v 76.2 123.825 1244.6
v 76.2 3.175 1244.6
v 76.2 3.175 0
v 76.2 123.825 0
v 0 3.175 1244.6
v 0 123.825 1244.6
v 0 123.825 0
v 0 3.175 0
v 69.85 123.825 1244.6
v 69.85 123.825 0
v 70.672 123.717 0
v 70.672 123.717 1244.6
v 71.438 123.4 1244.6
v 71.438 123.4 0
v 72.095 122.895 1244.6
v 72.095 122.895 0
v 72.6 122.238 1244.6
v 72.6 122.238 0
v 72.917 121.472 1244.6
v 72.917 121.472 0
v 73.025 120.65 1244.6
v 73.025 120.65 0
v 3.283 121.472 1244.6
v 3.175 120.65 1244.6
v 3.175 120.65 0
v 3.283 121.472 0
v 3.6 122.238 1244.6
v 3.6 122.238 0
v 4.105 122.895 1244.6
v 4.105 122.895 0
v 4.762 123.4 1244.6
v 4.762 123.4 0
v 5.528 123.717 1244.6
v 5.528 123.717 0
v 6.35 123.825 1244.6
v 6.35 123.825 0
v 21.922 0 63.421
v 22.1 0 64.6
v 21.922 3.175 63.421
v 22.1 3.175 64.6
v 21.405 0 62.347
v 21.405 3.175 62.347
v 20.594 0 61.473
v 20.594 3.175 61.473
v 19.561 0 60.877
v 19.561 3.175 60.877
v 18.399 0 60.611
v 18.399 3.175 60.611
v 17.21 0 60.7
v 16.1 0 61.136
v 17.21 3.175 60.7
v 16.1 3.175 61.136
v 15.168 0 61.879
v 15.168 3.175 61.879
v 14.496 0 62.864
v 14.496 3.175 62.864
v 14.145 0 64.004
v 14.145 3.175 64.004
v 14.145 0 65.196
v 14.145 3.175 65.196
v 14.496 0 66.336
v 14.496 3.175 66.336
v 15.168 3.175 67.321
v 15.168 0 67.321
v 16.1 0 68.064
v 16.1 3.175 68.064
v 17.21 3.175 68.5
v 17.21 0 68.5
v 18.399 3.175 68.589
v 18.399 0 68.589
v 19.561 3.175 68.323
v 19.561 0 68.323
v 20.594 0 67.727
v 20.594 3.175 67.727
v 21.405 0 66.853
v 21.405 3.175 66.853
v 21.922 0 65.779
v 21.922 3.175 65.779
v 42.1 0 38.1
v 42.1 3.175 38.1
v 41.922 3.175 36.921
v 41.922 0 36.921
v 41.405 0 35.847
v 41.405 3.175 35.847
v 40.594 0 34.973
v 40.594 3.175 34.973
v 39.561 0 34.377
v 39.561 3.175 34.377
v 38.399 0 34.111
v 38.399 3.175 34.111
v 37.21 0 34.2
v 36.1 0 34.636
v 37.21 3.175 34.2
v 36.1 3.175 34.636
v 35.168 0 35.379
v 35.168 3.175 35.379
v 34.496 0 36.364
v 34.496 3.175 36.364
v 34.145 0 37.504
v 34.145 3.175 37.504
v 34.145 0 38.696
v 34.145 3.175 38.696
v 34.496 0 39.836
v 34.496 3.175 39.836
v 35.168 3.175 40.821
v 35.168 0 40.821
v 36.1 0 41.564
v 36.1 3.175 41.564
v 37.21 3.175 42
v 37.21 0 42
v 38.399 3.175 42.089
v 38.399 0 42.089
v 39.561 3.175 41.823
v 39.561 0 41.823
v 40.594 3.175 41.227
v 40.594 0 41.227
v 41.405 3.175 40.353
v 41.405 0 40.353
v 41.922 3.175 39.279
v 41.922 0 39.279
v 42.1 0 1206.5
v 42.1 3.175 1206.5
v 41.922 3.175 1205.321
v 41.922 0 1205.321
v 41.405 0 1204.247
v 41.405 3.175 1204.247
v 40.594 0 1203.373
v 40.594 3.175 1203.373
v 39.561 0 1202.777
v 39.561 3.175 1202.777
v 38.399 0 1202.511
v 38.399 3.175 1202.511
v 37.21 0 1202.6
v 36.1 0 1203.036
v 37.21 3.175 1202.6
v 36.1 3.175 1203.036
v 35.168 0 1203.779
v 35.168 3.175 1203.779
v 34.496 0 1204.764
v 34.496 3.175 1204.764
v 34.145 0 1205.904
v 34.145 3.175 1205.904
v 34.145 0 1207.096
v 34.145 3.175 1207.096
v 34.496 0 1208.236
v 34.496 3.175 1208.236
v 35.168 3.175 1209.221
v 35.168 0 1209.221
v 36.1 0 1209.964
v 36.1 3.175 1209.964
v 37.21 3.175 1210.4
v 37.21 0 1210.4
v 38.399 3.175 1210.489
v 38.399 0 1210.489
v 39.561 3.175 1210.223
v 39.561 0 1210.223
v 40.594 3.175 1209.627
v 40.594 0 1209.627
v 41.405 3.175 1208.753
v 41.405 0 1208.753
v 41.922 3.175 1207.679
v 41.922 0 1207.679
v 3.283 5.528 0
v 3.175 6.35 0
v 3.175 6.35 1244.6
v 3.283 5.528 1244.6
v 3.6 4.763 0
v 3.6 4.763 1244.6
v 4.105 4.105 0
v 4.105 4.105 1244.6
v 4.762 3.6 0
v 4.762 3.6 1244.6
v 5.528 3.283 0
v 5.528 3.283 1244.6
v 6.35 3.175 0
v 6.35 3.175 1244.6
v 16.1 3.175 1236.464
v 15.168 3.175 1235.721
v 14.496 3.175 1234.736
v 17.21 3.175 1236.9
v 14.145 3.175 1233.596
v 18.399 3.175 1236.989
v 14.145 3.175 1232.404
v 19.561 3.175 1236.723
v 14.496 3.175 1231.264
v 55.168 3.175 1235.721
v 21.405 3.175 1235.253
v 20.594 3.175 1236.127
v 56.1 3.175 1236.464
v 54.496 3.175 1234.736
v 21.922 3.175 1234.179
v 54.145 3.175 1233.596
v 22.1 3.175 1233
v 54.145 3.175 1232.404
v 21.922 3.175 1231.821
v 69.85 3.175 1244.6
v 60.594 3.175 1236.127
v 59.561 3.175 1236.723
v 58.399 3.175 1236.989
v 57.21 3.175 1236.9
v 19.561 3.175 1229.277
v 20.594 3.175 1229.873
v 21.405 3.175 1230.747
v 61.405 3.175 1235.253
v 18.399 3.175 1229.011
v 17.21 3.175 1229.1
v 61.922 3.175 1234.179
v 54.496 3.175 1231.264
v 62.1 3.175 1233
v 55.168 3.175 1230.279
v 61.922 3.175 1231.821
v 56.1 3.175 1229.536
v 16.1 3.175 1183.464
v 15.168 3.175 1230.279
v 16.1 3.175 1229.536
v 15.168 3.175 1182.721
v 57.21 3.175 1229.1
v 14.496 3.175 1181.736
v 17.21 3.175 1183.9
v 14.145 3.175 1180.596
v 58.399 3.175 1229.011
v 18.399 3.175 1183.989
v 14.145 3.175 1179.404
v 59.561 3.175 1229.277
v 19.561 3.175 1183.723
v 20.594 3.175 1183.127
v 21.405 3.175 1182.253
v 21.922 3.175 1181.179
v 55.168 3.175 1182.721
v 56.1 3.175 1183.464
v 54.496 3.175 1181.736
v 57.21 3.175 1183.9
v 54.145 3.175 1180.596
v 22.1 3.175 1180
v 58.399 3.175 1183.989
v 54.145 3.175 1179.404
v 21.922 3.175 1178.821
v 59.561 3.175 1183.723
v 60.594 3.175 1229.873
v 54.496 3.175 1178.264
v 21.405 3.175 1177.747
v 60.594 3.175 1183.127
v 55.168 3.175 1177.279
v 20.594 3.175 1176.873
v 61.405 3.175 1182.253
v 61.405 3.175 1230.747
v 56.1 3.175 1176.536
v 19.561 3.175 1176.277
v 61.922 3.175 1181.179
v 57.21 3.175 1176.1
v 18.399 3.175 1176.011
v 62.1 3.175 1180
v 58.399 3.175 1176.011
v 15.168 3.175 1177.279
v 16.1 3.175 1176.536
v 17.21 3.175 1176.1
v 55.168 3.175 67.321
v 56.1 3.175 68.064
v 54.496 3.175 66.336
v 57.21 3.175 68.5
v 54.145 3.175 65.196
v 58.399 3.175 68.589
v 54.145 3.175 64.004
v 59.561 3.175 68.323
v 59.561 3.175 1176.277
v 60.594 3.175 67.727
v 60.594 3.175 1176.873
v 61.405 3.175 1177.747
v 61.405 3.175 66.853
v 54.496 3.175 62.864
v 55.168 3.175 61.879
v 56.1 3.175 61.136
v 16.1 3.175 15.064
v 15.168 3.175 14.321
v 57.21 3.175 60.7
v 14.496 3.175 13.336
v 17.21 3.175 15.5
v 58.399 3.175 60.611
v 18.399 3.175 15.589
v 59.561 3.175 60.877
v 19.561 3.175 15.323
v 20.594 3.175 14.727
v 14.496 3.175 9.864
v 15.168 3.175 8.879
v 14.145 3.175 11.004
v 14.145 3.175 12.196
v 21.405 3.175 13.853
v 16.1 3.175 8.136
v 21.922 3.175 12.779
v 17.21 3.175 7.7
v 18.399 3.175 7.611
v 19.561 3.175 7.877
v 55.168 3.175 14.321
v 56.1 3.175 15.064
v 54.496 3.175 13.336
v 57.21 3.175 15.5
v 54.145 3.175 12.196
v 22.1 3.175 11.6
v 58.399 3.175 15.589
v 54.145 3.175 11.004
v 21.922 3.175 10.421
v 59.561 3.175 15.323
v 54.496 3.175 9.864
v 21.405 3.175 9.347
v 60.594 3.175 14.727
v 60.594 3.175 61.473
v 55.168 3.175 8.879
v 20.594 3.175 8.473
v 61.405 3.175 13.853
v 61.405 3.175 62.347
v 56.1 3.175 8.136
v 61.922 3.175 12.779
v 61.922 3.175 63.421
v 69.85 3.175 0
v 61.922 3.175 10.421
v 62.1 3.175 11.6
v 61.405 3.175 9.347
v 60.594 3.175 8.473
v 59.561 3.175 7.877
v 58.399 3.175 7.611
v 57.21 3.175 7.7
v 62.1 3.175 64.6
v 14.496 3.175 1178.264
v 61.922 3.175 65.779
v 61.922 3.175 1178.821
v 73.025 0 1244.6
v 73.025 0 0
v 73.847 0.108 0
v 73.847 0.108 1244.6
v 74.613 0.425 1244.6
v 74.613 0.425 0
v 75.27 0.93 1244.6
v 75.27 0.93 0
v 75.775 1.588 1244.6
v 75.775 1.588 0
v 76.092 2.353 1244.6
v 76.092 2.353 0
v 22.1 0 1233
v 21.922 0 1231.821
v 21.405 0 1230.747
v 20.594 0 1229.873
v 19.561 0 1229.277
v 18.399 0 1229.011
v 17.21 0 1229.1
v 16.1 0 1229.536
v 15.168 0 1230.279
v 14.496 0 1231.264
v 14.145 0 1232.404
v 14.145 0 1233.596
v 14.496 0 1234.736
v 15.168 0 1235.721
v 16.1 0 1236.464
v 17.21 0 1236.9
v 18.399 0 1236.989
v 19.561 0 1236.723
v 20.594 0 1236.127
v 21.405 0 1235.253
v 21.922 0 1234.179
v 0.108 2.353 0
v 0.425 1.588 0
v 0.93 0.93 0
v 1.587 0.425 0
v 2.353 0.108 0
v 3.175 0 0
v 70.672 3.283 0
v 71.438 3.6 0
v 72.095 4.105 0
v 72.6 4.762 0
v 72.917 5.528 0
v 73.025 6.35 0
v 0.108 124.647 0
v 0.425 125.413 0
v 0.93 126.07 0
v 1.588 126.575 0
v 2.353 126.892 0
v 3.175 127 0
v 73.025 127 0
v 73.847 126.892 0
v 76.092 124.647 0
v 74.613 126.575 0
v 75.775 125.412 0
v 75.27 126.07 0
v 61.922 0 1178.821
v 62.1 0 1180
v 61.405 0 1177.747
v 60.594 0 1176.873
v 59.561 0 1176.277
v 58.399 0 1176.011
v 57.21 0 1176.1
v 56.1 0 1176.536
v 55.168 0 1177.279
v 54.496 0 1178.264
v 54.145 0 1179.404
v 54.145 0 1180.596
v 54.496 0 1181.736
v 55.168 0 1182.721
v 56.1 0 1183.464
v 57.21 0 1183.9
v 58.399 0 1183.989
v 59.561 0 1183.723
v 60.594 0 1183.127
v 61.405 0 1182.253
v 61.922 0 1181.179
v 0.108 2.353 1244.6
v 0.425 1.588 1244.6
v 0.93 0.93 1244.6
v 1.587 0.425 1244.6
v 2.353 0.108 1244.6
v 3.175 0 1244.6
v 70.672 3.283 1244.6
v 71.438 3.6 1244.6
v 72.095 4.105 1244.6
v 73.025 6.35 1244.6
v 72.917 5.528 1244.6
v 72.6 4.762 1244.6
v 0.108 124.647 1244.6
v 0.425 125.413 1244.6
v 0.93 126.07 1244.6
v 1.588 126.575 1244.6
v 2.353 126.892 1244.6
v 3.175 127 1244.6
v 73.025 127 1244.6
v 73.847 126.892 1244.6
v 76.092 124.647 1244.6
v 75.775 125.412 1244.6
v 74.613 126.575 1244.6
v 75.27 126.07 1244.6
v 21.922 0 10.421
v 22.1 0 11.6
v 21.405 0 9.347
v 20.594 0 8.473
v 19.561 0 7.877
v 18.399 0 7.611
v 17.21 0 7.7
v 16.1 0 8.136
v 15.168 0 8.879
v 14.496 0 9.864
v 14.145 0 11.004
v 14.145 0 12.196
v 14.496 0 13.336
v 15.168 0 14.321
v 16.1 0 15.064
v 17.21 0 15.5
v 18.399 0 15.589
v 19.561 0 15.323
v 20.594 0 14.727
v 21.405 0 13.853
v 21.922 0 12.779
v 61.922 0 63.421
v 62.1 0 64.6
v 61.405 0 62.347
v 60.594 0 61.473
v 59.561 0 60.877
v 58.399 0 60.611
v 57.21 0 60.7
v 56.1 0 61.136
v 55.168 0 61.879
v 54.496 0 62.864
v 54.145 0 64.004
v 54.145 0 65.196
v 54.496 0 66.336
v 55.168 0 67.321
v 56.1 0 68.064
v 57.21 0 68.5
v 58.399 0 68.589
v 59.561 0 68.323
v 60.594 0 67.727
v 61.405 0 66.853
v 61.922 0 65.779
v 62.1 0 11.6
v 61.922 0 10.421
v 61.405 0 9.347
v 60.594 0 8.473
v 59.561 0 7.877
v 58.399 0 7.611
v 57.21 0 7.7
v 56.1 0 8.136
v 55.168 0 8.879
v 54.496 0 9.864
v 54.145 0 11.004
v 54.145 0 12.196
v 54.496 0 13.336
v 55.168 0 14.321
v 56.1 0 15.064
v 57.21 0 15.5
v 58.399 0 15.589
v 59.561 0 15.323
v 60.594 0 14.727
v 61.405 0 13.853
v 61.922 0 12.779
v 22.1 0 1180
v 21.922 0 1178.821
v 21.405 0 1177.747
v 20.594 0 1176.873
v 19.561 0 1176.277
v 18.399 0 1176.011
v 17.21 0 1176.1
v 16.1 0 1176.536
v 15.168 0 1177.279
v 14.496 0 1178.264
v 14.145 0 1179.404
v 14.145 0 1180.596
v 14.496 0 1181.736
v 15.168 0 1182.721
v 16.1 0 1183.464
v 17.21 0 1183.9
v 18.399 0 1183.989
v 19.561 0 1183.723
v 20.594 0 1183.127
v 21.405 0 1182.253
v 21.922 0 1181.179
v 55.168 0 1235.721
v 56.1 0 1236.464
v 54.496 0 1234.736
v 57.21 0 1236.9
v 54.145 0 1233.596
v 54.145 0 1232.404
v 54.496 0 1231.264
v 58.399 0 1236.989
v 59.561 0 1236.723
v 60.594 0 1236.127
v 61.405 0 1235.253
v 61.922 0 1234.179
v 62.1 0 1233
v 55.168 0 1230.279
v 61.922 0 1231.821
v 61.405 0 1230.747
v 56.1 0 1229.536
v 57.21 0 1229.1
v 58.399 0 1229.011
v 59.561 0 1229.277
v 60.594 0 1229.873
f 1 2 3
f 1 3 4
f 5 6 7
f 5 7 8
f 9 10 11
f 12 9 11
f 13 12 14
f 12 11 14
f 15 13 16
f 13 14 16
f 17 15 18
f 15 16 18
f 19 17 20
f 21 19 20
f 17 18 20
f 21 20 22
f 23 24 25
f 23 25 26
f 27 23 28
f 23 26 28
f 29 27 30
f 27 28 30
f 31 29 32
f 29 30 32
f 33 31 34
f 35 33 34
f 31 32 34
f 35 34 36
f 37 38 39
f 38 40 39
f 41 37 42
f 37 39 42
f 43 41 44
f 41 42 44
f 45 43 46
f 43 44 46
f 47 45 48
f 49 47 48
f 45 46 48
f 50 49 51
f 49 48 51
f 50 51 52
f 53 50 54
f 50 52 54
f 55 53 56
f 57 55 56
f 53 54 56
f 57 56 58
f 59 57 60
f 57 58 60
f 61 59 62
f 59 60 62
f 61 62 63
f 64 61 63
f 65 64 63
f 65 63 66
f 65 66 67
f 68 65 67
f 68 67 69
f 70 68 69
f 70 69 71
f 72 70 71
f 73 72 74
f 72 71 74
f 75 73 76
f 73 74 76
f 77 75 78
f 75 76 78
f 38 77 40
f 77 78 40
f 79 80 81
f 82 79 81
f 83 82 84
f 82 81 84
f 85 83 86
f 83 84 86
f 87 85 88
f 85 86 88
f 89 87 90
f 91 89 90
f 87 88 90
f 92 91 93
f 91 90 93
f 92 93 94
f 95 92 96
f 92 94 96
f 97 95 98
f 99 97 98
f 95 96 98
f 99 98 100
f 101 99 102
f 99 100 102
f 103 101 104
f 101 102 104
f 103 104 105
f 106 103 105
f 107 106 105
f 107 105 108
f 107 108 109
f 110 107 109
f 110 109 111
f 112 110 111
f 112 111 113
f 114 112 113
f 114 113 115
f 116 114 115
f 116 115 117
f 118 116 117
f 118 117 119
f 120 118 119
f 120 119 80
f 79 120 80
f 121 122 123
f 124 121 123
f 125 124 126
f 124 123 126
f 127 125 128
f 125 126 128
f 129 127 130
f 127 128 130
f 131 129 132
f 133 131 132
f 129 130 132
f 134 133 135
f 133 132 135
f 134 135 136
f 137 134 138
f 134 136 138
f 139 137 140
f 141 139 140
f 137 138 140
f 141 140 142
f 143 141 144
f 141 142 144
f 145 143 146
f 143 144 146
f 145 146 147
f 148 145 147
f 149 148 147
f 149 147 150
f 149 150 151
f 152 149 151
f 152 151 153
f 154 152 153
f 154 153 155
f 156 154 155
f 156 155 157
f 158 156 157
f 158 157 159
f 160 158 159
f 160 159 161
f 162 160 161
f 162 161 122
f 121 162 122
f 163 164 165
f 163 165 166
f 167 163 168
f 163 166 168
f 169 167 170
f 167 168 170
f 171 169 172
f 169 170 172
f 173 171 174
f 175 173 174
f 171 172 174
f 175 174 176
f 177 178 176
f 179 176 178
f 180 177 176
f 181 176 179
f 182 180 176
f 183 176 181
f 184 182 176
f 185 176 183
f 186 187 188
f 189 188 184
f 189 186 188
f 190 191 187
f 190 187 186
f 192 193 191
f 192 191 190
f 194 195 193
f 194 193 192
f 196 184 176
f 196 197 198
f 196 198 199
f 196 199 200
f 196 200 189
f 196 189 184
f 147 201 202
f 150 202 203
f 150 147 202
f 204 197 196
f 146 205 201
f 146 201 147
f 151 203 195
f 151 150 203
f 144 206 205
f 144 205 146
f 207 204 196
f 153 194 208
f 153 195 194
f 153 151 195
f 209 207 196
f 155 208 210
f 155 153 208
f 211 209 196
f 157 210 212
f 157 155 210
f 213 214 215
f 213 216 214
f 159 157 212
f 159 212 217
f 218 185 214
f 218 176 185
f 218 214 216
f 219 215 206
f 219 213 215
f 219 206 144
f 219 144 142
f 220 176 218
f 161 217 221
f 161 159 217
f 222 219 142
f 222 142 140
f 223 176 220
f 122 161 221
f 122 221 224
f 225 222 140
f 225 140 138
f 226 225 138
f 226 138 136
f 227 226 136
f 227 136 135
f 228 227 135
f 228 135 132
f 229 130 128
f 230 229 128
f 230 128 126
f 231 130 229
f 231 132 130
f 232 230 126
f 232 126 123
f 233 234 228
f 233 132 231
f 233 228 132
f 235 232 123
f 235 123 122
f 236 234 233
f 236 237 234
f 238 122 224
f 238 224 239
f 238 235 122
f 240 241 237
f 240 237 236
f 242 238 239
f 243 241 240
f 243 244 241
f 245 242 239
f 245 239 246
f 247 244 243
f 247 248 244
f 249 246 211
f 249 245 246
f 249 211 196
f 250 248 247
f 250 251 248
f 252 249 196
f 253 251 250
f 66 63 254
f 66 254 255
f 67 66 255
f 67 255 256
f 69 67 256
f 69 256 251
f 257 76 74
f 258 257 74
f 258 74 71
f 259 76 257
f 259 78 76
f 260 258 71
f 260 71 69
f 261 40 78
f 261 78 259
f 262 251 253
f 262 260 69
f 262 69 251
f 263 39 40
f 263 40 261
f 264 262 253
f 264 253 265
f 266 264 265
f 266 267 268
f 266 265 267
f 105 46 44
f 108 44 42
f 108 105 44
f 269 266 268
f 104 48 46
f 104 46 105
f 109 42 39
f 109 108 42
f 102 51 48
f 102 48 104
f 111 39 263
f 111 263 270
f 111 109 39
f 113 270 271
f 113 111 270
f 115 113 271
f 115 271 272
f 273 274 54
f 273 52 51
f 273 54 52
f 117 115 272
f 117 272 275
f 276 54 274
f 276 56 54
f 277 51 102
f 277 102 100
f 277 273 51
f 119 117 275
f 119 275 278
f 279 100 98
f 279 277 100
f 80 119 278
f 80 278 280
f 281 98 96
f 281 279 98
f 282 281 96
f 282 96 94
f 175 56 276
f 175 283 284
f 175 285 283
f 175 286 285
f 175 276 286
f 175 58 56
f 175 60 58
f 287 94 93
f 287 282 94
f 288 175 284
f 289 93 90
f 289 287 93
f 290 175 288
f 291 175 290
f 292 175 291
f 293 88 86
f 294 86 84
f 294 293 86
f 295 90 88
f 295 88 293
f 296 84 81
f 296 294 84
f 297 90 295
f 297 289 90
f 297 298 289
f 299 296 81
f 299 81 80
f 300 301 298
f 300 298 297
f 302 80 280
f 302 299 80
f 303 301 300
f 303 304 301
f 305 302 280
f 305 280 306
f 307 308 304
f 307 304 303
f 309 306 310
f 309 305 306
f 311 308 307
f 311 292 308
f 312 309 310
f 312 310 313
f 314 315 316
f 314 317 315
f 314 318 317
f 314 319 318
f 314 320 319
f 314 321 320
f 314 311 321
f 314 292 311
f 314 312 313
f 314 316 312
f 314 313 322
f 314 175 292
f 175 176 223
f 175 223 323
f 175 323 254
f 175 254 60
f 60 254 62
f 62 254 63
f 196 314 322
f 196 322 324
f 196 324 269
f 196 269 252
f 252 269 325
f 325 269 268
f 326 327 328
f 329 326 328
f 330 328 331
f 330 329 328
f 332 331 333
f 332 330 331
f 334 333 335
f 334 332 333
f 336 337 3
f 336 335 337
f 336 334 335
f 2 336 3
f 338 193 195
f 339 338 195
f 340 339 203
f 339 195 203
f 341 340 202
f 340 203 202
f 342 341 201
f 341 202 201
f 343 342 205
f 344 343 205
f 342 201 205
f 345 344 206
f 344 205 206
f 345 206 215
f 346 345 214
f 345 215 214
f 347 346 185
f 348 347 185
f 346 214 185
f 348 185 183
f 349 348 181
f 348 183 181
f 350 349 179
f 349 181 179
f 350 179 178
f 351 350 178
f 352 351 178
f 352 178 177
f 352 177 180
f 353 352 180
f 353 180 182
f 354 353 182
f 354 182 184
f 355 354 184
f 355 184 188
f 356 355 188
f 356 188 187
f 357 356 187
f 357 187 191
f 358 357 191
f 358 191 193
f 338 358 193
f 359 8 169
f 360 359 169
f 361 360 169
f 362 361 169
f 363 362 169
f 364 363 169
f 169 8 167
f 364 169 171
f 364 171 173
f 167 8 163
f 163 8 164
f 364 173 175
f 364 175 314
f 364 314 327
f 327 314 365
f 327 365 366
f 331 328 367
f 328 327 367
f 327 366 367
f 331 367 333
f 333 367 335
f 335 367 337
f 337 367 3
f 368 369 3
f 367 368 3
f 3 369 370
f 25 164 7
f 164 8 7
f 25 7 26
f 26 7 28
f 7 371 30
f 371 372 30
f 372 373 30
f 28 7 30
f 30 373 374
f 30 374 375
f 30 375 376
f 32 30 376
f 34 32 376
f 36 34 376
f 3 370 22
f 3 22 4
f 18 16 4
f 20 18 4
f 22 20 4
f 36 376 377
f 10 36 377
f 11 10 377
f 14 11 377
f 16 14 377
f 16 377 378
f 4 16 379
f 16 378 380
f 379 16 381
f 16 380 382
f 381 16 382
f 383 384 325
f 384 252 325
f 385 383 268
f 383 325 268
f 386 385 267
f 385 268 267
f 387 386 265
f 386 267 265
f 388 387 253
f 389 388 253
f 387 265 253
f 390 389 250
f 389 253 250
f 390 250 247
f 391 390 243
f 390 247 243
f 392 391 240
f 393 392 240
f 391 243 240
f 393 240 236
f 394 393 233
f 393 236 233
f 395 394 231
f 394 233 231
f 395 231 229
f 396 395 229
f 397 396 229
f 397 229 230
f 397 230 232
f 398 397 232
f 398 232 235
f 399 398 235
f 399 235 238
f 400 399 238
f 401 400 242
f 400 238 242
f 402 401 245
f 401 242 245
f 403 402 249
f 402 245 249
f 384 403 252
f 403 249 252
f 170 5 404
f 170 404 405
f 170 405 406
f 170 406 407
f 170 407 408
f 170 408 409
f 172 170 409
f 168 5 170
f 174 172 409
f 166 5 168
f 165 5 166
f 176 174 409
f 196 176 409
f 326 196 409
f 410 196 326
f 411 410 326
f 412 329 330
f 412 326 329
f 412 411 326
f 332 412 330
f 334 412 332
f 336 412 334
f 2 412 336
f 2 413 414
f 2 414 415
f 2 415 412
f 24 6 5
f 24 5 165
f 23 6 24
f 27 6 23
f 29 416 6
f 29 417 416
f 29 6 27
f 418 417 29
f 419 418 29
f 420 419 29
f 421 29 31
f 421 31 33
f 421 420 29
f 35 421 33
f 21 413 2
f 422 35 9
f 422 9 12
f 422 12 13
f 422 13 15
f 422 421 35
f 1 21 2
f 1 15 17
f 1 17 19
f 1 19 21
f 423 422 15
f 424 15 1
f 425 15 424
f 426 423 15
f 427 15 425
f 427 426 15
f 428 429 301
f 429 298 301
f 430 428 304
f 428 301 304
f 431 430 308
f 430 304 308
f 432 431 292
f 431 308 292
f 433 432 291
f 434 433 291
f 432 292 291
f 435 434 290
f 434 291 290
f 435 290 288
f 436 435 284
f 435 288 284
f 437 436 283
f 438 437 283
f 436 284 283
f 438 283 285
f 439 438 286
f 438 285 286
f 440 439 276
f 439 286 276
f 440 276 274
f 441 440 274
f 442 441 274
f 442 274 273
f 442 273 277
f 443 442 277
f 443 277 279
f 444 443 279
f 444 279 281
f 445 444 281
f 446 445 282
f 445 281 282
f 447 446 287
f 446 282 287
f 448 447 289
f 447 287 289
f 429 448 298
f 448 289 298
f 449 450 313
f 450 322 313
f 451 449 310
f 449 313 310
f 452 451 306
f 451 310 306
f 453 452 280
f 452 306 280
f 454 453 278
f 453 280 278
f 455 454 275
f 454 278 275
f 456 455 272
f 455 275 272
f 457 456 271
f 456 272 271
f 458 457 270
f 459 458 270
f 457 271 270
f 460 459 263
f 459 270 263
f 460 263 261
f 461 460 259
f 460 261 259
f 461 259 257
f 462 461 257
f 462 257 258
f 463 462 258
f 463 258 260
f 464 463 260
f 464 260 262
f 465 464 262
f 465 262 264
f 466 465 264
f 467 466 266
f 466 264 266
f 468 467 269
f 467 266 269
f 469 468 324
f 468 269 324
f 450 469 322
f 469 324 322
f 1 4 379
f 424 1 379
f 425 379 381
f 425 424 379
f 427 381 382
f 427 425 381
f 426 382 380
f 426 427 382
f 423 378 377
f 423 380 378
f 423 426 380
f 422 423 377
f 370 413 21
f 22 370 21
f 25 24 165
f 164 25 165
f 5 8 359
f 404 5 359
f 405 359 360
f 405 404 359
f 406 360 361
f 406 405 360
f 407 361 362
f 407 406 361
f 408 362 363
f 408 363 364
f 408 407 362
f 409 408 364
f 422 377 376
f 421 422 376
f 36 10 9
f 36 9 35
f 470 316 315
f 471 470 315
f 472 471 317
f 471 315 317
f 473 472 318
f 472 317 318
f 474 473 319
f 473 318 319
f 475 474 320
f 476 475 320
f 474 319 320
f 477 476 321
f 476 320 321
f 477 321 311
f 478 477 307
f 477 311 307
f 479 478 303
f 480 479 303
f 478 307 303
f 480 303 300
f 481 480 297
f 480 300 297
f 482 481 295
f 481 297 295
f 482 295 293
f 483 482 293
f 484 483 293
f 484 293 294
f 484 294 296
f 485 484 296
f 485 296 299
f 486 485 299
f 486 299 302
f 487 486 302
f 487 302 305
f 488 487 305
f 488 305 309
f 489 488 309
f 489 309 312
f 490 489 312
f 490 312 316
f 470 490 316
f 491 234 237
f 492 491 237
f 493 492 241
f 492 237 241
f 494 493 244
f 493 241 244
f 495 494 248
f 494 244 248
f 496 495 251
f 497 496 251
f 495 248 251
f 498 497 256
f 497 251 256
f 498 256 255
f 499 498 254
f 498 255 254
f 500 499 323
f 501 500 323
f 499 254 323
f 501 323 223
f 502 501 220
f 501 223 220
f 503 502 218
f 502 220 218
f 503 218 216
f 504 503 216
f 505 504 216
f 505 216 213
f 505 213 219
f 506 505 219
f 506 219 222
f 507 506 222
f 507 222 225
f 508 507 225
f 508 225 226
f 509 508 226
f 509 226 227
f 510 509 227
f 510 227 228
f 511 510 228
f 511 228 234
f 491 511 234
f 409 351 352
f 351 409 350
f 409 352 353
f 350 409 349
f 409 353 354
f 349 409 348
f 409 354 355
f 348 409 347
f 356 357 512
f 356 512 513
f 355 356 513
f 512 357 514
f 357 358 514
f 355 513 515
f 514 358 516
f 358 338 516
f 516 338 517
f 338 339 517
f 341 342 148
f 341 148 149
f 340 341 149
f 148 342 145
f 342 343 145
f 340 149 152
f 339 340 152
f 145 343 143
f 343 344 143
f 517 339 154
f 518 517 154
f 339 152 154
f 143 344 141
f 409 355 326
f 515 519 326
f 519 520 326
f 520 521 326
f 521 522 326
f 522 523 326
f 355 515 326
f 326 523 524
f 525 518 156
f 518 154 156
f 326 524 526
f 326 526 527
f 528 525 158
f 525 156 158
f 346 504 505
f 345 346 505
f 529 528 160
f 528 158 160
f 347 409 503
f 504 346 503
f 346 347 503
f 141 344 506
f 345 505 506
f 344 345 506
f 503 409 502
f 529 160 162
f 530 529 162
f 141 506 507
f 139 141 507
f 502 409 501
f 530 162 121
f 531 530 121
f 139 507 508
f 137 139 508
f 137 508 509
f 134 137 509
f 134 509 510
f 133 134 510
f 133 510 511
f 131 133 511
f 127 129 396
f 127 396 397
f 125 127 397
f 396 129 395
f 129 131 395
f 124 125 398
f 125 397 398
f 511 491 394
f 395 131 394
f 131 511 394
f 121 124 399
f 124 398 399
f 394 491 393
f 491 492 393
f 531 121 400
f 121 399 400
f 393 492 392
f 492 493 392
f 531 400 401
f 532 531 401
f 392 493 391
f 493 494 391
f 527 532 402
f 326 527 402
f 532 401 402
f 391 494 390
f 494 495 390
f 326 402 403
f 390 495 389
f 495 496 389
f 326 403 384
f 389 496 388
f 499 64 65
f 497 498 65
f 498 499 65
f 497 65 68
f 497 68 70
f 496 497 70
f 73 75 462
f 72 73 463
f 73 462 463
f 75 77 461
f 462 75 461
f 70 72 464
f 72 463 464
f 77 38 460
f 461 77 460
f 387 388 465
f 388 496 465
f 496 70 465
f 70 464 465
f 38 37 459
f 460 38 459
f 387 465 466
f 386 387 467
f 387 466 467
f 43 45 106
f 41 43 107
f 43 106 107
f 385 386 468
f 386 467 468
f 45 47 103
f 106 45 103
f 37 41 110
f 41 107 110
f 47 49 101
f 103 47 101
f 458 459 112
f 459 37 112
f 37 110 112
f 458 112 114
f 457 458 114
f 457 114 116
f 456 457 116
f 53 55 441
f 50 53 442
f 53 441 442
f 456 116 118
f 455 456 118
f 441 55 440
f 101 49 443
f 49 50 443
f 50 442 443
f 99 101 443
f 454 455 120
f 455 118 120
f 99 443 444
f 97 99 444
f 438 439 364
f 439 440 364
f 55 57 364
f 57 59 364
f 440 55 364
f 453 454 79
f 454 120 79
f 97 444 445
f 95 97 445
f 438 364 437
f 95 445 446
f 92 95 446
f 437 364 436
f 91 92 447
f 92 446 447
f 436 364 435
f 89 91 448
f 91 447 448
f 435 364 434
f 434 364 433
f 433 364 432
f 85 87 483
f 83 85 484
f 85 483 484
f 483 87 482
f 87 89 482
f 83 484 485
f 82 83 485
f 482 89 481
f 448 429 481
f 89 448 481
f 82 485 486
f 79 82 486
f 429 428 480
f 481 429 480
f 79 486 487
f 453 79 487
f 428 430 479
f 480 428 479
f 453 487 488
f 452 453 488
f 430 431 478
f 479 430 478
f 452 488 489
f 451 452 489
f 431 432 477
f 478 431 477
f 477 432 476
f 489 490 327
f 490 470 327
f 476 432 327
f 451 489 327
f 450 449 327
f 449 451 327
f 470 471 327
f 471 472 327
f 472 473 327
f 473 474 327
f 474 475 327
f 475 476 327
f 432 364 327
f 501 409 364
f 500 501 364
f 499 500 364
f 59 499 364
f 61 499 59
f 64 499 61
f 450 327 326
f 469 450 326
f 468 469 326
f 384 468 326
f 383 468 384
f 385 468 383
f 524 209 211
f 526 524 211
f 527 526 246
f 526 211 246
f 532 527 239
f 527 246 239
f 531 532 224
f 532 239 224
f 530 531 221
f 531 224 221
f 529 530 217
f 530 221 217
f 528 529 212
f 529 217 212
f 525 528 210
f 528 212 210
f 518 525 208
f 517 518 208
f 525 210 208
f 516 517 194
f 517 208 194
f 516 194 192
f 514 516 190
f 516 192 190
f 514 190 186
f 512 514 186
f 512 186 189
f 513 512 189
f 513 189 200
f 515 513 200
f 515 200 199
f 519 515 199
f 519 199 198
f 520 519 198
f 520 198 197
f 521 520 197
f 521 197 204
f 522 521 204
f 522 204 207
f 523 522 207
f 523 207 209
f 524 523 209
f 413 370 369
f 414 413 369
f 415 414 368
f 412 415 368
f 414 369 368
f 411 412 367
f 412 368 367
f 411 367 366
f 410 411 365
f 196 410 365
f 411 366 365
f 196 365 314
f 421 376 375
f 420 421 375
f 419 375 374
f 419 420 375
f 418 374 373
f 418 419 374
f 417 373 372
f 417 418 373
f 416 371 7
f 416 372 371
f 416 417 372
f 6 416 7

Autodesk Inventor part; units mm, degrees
ref_plane "YZ Plane" through (0, 0, 0) normal (1, 0, 0) x (0, 1, 0)
ref_plane "XZ Plane" through (0, 0, 0) normal (0, 1, 0) x (-1, 0, 0)
ref_plane "XY Plane" through (0, 0, 0) normal (0, 0, 1) x (1, 0, 0)
sketch "Sketch1" plane through (0, 0, 0) normal (0, 0, 1) x (1, 0, 0)
  line L0 (0, 0) -> (76.2, 0)
  line L1 (76.2, 0) -> (76.2, 127)
  line L2 (76.2, 127) -> (0, 127)
  line L3 (0, 127) -> (0, 0)
  dimension "d0" = 76.2
  dimension "d1" = 127
extrude "Extrusion1" add sketch "Sketch1" along normal blind 1244.6
shell "Shell1" thickness 3.175 removed faces 2 at (50.8, 42.3333, 0) at (50.8, 42.3333, 1244.6)
fillet "Fillet1" radius 3.175 8 edges at (0, 127, 622.3) (3.175, 3.175, 622.3) (73.025, 3.175, 622.3) (3.175, 123.825, 622.3) (73.025, 123.825, 622.3) (76.2, 127, 622.3) (0, 0, 622.3) (76.2, 0, 622.3)
sketch "Sketch2" plane through (6.35, 3.175, 0) normal (0, 1, 0) x (1, 0, 0)
  line L0 (-6.35, 0) -> (69.85, 0)
  line L1 (69.85, 0) -> (69.85, -76.2)
  line L2 (69.85, -76.2) -> (-6.35, -76.2)
  line L3 (-6.35, -76.2) -> (-6.35, 0)
  line L4 (51.75, -11.6) -> (11.75, -11.6) construction
  line L5 (11.75, -11.6) -> (11.75, -64.6) construction
  line L6 (11.75, -64.6) -> (51.75, -64.6)
  line L7 (51.75, -64.6) -> (51.75, -11.6) construction
  circle A0 centre (11.75, -64.6) radius 4
  circle A1 centre (11.75, -11.6) radius 4
  circle A2 centre (51.75, -64.6) radius 4
  circle A3 centre (51.75, -11.6) radius 4
  circle A4 centre (31.75, -38.1) radius 4
  circle A5 centre (31.75, -1206.5) radius 4
  line L8 (51.75, -1180) -> (11.75, -1180) construction
  line L9 (11.75, -1180) -> (11.75, -1233) construction
  line L10 (-6.35, -1168.4) -> (69.85, -1168.4)
  line L11 (-6.35, -1244.6) -> (-6.35, -1168.4)
  circle A6 centre (11.75, -1180) radius 4
  line L12 (51.75, -1233) -> (51.75, -1180) construction
  line L13 (69.85, -1168.4) -> (69.85, -1244.6)
  circle A7 centre (51.75, -1180) radius 4
  line L14 (11.75, -1233) -> (51.75, -1233)
  circle A8 centre (11.75, -1233) radius 4
  line L15 (69.85, -1244.6) -> (-6.35, -1244.6)
  circle A9 centre (51.75, -1233) radius 4
  point P0 (31.75, -64.6)
  point P1 (31.75, -76.2)
  point P2 (51.75, -38.1)
  point P3 (69.85, -38.1)
  point P4 (51.75, -1206.5)
  point P5 (69.85, -1206.5)
  point P6 (31.75, -1233)
  point P7 (31.75, -1244.6)
  dimension "d6" = 76.2
  dimension "d7" = 76.2
  dimension "d8" = 53
  dimension "d9" = 40
  dimension "d10" = 8
  dimension "d13" = 1168.4
extrude "Extrusion2" cut sketch "Sketch2" against normal up to surface (3.175 mm away) contours A2 | A0 | A1 | A3 | A4 | A5 | A6 | A7 | A9 | A8
properties part number "2x3_Tube"
